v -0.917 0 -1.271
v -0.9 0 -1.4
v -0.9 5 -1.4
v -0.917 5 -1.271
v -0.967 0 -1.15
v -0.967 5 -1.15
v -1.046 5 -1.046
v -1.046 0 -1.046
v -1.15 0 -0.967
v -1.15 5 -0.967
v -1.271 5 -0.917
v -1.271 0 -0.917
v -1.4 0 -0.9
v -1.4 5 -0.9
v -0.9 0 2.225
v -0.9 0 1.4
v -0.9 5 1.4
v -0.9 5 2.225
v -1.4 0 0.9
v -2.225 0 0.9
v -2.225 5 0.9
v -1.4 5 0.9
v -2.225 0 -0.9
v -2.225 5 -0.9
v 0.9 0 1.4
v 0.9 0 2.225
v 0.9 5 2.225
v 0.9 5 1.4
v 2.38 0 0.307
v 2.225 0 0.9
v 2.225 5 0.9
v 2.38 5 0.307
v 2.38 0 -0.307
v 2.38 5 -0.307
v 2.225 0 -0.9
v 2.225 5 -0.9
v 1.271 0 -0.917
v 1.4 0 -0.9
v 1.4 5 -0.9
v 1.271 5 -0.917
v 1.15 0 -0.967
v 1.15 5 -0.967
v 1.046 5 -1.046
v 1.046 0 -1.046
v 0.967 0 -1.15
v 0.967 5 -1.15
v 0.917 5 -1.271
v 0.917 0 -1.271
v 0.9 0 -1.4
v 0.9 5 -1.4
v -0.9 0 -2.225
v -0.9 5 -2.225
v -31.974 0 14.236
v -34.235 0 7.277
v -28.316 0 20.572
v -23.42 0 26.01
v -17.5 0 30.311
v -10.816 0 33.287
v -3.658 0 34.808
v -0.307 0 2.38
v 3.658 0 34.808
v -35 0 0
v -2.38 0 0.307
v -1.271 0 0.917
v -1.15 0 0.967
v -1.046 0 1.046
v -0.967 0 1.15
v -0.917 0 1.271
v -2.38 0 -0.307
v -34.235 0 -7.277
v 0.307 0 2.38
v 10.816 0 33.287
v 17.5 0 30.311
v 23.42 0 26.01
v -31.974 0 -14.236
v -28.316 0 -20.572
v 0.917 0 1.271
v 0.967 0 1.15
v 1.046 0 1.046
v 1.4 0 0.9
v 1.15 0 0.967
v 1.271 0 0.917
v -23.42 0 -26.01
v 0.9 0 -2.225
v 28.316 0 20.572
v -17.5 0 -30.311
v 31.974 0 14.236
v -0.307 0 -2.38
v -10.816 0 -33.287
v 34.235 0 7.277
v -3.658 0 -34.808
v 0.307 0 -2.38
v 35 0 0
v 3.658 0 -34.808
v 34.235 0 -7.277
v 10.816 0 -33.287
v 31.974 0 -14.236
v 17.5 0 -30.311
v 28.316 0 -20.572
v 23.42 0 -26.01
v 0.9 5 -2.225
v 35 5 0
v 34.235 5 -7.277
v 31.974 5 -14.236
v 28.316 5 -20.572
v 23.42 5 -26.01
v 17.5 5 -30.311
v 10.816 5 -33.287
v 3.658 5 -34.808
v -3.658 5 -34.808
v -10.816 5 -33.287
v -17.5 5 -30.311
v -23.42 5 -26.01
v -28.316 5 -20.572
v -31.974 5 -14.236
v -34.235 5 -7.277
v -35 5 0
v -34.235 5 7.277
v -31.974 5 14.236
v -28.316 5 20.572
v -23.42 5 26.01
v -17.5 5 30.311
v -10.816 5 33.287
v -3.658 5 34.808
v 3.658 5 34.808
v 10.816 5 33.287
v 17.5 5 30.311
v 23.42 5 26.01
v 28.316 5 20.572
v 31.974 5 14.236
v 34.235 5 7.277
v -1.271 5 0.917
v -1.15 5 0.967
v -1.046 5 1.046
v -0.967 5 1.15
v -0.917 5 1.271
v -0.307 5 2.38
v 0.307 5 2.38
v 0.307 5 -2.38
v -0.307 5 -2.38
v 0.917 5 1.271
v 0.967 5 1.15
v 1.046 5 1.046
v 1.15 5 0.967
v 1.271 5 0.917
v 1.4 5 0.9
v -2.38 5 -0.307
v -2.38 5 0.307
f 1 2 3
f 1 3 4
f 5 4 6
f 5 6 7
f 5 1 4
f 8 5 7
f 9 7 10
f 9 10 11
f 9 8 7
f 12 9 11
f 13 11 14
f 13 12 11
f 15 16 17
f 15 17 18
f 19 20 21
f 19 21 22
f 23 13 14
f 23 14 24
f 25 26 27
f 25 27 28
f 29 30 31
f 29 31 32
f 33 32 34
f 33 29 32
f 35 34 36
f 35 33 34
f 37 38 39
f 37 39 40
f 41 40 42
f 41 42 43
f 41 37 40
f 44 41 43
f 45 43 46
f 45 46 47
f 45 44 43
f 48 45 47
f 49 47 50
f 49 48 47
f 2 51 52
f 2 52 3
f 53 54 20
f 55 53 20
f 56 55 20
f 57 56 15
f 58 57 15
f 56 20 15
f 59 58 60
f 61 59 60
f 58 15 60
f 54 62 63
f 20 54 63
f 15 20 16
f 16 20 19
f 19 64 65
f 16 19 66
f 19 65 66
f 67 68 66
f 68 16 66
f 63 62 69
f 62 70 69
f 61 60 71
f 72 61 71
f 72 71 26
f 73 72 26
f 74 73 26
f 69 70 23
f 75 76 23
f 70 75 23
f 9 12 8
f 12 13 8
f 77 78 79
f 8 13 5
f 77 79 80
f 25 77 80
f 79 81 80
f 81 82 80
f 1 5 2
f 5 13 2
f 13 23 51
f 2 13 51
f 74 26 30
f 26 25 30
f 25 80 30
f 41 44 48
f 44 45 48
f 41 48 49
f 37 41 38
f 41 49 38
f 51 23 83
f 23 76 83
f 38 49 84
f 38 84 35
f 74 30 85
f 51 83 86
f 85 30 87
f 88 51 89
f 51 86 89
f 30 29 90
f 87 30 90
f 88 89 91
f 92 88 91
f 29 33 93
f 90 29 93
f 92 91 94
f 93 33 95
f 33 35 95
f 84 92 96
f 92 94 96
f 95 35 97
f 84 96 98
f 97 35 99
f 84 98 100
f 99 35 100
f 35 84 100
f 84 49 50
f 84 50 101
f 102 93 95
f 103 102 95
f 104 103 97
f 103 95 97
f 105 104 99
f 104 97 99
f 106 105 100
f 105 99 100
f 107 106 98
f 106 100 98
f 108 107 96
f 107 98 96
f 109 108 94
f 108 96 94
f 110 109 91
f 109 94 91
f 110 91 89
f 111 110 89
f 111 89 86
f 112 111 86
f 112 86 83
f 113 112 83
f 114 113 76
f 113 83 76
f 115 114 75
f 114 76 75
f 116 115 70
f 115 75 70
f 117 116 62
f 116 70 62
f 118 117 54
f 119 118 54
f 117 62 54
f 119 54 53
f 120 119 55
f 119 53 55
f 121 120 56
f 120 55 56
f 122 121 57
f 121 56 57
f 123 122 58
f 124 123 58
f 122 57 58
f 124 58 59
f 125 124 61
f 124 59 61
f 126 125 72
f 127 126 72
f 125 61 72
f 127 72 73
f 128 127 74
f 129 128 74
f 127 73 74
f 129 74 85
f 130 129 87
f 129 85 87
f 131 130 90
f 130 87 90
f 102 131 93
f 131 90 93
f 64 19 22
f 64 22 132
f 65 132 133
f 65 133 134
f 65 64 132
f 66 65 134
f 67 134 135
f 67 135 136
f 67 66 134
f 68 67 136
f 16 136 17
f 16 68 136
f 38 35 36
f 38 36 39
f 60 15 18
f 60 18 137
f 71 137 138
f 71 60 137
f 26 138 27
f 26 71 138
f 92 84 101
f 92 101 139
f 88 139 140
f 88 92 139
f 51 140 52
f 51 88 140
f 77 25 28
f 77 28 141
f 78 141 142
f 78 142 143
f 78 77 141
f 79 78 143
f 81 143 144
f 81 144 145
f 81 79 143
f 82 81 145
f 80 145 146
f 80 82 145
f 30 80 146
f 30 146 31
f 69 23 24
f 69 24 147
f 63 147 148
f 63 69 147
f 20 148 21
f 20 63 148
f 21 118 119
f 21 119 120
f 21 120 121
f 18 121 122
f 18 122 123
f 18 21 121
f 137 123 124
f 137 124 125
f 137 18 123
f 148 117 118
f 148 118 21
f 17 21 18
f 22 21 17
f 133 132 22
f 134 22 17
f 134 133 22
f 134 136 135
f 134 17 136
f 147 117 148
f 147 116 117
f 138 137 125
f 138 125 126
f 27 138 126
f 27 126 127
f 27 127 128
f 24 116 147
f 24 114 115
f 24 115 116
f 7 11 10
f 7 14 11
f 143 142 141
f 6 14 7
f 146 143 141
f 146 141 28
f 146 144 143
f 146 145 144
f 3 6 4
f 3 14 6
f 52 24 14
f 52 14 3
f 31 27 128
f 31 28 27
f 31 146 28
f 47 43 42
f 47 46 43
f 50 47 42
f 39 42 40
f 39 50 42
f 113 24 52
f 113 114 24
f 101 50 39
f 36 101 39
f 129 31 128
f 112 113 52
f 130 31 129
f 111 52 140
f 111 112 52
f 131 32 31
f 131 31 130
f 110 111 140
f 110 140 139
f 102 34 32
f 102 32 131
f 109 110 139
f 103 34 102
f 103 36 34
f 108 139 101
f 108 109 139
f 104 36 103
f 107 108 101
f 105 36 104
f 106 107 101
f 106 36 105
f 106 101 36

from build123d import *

# Parameters (mm, degrees)
SKETCH1_R           = 35
BOSS_EXTRUDE1_DEPTH = 5


with BuildPart() as part:
    # Sketch1 → Boss-Extrude1 (new body)
    with BuildSketch(Plane(origin=(0, 0, 0), x_dir=(1, 0, 0), z_dir=(0, 1, 0))):
        Circle(SKETCH1_R)
        with BuildLine():
            Line((-1.4, 0.9), (-2.224859546, 0.9))
            ThreePointArc((-2.224859546, 0.9), (-2.4, 0), (-2.224859546, -0.9))
            Line((-2.224859546, -0.9), (-1.4, -0.9))
            ThreePointArc((-1.4, -0.9), (-1.046446609, -1.046446609), (-0.9, -1.4))
            Line((-0.9, -1.4), (-0.9, -2.224859546))
            ThreePointArc((-0.9, -2.224859546), (0, -2.4), (0.9, -2.224859546))
            Line((0.9, -2.224859546), (0.9, -1.4))
            ThreePointArc((0.9, -1.4), (1.046446609, -1.046446609), (1.4, -0.9))
            Line((1.4, -0.9), (2.224859546, -0.9))
            ThreePointArc((2.224859546, -0.9), (2.4, 0), (2.224859546, 0.9))
            Line((2.224859546, 0.9), (1.4, 0.9))
            ThreePointArc((1.4, 0.9), (1.046446609, 1.046446609), (0.9, 1.4))
            Line((0.9, 1.4), (0.9, 2.224859546))
            ThreePointArc((0.9, 2.224859546), (0, 2.4), (-0.9, 2.224859546))
            Line((-0.9, 2.224859546), (-0.9, 1.4))
            ThreePointArc((-0.9, 1.4), (-1.046446609, 1.046446609), (-1.4, 0.9))
        make_face(mode=Mode.SUBTRACT)
    extrude(amount=BOSS_EXTRUDE1_DEPTH)


solid = part.part
